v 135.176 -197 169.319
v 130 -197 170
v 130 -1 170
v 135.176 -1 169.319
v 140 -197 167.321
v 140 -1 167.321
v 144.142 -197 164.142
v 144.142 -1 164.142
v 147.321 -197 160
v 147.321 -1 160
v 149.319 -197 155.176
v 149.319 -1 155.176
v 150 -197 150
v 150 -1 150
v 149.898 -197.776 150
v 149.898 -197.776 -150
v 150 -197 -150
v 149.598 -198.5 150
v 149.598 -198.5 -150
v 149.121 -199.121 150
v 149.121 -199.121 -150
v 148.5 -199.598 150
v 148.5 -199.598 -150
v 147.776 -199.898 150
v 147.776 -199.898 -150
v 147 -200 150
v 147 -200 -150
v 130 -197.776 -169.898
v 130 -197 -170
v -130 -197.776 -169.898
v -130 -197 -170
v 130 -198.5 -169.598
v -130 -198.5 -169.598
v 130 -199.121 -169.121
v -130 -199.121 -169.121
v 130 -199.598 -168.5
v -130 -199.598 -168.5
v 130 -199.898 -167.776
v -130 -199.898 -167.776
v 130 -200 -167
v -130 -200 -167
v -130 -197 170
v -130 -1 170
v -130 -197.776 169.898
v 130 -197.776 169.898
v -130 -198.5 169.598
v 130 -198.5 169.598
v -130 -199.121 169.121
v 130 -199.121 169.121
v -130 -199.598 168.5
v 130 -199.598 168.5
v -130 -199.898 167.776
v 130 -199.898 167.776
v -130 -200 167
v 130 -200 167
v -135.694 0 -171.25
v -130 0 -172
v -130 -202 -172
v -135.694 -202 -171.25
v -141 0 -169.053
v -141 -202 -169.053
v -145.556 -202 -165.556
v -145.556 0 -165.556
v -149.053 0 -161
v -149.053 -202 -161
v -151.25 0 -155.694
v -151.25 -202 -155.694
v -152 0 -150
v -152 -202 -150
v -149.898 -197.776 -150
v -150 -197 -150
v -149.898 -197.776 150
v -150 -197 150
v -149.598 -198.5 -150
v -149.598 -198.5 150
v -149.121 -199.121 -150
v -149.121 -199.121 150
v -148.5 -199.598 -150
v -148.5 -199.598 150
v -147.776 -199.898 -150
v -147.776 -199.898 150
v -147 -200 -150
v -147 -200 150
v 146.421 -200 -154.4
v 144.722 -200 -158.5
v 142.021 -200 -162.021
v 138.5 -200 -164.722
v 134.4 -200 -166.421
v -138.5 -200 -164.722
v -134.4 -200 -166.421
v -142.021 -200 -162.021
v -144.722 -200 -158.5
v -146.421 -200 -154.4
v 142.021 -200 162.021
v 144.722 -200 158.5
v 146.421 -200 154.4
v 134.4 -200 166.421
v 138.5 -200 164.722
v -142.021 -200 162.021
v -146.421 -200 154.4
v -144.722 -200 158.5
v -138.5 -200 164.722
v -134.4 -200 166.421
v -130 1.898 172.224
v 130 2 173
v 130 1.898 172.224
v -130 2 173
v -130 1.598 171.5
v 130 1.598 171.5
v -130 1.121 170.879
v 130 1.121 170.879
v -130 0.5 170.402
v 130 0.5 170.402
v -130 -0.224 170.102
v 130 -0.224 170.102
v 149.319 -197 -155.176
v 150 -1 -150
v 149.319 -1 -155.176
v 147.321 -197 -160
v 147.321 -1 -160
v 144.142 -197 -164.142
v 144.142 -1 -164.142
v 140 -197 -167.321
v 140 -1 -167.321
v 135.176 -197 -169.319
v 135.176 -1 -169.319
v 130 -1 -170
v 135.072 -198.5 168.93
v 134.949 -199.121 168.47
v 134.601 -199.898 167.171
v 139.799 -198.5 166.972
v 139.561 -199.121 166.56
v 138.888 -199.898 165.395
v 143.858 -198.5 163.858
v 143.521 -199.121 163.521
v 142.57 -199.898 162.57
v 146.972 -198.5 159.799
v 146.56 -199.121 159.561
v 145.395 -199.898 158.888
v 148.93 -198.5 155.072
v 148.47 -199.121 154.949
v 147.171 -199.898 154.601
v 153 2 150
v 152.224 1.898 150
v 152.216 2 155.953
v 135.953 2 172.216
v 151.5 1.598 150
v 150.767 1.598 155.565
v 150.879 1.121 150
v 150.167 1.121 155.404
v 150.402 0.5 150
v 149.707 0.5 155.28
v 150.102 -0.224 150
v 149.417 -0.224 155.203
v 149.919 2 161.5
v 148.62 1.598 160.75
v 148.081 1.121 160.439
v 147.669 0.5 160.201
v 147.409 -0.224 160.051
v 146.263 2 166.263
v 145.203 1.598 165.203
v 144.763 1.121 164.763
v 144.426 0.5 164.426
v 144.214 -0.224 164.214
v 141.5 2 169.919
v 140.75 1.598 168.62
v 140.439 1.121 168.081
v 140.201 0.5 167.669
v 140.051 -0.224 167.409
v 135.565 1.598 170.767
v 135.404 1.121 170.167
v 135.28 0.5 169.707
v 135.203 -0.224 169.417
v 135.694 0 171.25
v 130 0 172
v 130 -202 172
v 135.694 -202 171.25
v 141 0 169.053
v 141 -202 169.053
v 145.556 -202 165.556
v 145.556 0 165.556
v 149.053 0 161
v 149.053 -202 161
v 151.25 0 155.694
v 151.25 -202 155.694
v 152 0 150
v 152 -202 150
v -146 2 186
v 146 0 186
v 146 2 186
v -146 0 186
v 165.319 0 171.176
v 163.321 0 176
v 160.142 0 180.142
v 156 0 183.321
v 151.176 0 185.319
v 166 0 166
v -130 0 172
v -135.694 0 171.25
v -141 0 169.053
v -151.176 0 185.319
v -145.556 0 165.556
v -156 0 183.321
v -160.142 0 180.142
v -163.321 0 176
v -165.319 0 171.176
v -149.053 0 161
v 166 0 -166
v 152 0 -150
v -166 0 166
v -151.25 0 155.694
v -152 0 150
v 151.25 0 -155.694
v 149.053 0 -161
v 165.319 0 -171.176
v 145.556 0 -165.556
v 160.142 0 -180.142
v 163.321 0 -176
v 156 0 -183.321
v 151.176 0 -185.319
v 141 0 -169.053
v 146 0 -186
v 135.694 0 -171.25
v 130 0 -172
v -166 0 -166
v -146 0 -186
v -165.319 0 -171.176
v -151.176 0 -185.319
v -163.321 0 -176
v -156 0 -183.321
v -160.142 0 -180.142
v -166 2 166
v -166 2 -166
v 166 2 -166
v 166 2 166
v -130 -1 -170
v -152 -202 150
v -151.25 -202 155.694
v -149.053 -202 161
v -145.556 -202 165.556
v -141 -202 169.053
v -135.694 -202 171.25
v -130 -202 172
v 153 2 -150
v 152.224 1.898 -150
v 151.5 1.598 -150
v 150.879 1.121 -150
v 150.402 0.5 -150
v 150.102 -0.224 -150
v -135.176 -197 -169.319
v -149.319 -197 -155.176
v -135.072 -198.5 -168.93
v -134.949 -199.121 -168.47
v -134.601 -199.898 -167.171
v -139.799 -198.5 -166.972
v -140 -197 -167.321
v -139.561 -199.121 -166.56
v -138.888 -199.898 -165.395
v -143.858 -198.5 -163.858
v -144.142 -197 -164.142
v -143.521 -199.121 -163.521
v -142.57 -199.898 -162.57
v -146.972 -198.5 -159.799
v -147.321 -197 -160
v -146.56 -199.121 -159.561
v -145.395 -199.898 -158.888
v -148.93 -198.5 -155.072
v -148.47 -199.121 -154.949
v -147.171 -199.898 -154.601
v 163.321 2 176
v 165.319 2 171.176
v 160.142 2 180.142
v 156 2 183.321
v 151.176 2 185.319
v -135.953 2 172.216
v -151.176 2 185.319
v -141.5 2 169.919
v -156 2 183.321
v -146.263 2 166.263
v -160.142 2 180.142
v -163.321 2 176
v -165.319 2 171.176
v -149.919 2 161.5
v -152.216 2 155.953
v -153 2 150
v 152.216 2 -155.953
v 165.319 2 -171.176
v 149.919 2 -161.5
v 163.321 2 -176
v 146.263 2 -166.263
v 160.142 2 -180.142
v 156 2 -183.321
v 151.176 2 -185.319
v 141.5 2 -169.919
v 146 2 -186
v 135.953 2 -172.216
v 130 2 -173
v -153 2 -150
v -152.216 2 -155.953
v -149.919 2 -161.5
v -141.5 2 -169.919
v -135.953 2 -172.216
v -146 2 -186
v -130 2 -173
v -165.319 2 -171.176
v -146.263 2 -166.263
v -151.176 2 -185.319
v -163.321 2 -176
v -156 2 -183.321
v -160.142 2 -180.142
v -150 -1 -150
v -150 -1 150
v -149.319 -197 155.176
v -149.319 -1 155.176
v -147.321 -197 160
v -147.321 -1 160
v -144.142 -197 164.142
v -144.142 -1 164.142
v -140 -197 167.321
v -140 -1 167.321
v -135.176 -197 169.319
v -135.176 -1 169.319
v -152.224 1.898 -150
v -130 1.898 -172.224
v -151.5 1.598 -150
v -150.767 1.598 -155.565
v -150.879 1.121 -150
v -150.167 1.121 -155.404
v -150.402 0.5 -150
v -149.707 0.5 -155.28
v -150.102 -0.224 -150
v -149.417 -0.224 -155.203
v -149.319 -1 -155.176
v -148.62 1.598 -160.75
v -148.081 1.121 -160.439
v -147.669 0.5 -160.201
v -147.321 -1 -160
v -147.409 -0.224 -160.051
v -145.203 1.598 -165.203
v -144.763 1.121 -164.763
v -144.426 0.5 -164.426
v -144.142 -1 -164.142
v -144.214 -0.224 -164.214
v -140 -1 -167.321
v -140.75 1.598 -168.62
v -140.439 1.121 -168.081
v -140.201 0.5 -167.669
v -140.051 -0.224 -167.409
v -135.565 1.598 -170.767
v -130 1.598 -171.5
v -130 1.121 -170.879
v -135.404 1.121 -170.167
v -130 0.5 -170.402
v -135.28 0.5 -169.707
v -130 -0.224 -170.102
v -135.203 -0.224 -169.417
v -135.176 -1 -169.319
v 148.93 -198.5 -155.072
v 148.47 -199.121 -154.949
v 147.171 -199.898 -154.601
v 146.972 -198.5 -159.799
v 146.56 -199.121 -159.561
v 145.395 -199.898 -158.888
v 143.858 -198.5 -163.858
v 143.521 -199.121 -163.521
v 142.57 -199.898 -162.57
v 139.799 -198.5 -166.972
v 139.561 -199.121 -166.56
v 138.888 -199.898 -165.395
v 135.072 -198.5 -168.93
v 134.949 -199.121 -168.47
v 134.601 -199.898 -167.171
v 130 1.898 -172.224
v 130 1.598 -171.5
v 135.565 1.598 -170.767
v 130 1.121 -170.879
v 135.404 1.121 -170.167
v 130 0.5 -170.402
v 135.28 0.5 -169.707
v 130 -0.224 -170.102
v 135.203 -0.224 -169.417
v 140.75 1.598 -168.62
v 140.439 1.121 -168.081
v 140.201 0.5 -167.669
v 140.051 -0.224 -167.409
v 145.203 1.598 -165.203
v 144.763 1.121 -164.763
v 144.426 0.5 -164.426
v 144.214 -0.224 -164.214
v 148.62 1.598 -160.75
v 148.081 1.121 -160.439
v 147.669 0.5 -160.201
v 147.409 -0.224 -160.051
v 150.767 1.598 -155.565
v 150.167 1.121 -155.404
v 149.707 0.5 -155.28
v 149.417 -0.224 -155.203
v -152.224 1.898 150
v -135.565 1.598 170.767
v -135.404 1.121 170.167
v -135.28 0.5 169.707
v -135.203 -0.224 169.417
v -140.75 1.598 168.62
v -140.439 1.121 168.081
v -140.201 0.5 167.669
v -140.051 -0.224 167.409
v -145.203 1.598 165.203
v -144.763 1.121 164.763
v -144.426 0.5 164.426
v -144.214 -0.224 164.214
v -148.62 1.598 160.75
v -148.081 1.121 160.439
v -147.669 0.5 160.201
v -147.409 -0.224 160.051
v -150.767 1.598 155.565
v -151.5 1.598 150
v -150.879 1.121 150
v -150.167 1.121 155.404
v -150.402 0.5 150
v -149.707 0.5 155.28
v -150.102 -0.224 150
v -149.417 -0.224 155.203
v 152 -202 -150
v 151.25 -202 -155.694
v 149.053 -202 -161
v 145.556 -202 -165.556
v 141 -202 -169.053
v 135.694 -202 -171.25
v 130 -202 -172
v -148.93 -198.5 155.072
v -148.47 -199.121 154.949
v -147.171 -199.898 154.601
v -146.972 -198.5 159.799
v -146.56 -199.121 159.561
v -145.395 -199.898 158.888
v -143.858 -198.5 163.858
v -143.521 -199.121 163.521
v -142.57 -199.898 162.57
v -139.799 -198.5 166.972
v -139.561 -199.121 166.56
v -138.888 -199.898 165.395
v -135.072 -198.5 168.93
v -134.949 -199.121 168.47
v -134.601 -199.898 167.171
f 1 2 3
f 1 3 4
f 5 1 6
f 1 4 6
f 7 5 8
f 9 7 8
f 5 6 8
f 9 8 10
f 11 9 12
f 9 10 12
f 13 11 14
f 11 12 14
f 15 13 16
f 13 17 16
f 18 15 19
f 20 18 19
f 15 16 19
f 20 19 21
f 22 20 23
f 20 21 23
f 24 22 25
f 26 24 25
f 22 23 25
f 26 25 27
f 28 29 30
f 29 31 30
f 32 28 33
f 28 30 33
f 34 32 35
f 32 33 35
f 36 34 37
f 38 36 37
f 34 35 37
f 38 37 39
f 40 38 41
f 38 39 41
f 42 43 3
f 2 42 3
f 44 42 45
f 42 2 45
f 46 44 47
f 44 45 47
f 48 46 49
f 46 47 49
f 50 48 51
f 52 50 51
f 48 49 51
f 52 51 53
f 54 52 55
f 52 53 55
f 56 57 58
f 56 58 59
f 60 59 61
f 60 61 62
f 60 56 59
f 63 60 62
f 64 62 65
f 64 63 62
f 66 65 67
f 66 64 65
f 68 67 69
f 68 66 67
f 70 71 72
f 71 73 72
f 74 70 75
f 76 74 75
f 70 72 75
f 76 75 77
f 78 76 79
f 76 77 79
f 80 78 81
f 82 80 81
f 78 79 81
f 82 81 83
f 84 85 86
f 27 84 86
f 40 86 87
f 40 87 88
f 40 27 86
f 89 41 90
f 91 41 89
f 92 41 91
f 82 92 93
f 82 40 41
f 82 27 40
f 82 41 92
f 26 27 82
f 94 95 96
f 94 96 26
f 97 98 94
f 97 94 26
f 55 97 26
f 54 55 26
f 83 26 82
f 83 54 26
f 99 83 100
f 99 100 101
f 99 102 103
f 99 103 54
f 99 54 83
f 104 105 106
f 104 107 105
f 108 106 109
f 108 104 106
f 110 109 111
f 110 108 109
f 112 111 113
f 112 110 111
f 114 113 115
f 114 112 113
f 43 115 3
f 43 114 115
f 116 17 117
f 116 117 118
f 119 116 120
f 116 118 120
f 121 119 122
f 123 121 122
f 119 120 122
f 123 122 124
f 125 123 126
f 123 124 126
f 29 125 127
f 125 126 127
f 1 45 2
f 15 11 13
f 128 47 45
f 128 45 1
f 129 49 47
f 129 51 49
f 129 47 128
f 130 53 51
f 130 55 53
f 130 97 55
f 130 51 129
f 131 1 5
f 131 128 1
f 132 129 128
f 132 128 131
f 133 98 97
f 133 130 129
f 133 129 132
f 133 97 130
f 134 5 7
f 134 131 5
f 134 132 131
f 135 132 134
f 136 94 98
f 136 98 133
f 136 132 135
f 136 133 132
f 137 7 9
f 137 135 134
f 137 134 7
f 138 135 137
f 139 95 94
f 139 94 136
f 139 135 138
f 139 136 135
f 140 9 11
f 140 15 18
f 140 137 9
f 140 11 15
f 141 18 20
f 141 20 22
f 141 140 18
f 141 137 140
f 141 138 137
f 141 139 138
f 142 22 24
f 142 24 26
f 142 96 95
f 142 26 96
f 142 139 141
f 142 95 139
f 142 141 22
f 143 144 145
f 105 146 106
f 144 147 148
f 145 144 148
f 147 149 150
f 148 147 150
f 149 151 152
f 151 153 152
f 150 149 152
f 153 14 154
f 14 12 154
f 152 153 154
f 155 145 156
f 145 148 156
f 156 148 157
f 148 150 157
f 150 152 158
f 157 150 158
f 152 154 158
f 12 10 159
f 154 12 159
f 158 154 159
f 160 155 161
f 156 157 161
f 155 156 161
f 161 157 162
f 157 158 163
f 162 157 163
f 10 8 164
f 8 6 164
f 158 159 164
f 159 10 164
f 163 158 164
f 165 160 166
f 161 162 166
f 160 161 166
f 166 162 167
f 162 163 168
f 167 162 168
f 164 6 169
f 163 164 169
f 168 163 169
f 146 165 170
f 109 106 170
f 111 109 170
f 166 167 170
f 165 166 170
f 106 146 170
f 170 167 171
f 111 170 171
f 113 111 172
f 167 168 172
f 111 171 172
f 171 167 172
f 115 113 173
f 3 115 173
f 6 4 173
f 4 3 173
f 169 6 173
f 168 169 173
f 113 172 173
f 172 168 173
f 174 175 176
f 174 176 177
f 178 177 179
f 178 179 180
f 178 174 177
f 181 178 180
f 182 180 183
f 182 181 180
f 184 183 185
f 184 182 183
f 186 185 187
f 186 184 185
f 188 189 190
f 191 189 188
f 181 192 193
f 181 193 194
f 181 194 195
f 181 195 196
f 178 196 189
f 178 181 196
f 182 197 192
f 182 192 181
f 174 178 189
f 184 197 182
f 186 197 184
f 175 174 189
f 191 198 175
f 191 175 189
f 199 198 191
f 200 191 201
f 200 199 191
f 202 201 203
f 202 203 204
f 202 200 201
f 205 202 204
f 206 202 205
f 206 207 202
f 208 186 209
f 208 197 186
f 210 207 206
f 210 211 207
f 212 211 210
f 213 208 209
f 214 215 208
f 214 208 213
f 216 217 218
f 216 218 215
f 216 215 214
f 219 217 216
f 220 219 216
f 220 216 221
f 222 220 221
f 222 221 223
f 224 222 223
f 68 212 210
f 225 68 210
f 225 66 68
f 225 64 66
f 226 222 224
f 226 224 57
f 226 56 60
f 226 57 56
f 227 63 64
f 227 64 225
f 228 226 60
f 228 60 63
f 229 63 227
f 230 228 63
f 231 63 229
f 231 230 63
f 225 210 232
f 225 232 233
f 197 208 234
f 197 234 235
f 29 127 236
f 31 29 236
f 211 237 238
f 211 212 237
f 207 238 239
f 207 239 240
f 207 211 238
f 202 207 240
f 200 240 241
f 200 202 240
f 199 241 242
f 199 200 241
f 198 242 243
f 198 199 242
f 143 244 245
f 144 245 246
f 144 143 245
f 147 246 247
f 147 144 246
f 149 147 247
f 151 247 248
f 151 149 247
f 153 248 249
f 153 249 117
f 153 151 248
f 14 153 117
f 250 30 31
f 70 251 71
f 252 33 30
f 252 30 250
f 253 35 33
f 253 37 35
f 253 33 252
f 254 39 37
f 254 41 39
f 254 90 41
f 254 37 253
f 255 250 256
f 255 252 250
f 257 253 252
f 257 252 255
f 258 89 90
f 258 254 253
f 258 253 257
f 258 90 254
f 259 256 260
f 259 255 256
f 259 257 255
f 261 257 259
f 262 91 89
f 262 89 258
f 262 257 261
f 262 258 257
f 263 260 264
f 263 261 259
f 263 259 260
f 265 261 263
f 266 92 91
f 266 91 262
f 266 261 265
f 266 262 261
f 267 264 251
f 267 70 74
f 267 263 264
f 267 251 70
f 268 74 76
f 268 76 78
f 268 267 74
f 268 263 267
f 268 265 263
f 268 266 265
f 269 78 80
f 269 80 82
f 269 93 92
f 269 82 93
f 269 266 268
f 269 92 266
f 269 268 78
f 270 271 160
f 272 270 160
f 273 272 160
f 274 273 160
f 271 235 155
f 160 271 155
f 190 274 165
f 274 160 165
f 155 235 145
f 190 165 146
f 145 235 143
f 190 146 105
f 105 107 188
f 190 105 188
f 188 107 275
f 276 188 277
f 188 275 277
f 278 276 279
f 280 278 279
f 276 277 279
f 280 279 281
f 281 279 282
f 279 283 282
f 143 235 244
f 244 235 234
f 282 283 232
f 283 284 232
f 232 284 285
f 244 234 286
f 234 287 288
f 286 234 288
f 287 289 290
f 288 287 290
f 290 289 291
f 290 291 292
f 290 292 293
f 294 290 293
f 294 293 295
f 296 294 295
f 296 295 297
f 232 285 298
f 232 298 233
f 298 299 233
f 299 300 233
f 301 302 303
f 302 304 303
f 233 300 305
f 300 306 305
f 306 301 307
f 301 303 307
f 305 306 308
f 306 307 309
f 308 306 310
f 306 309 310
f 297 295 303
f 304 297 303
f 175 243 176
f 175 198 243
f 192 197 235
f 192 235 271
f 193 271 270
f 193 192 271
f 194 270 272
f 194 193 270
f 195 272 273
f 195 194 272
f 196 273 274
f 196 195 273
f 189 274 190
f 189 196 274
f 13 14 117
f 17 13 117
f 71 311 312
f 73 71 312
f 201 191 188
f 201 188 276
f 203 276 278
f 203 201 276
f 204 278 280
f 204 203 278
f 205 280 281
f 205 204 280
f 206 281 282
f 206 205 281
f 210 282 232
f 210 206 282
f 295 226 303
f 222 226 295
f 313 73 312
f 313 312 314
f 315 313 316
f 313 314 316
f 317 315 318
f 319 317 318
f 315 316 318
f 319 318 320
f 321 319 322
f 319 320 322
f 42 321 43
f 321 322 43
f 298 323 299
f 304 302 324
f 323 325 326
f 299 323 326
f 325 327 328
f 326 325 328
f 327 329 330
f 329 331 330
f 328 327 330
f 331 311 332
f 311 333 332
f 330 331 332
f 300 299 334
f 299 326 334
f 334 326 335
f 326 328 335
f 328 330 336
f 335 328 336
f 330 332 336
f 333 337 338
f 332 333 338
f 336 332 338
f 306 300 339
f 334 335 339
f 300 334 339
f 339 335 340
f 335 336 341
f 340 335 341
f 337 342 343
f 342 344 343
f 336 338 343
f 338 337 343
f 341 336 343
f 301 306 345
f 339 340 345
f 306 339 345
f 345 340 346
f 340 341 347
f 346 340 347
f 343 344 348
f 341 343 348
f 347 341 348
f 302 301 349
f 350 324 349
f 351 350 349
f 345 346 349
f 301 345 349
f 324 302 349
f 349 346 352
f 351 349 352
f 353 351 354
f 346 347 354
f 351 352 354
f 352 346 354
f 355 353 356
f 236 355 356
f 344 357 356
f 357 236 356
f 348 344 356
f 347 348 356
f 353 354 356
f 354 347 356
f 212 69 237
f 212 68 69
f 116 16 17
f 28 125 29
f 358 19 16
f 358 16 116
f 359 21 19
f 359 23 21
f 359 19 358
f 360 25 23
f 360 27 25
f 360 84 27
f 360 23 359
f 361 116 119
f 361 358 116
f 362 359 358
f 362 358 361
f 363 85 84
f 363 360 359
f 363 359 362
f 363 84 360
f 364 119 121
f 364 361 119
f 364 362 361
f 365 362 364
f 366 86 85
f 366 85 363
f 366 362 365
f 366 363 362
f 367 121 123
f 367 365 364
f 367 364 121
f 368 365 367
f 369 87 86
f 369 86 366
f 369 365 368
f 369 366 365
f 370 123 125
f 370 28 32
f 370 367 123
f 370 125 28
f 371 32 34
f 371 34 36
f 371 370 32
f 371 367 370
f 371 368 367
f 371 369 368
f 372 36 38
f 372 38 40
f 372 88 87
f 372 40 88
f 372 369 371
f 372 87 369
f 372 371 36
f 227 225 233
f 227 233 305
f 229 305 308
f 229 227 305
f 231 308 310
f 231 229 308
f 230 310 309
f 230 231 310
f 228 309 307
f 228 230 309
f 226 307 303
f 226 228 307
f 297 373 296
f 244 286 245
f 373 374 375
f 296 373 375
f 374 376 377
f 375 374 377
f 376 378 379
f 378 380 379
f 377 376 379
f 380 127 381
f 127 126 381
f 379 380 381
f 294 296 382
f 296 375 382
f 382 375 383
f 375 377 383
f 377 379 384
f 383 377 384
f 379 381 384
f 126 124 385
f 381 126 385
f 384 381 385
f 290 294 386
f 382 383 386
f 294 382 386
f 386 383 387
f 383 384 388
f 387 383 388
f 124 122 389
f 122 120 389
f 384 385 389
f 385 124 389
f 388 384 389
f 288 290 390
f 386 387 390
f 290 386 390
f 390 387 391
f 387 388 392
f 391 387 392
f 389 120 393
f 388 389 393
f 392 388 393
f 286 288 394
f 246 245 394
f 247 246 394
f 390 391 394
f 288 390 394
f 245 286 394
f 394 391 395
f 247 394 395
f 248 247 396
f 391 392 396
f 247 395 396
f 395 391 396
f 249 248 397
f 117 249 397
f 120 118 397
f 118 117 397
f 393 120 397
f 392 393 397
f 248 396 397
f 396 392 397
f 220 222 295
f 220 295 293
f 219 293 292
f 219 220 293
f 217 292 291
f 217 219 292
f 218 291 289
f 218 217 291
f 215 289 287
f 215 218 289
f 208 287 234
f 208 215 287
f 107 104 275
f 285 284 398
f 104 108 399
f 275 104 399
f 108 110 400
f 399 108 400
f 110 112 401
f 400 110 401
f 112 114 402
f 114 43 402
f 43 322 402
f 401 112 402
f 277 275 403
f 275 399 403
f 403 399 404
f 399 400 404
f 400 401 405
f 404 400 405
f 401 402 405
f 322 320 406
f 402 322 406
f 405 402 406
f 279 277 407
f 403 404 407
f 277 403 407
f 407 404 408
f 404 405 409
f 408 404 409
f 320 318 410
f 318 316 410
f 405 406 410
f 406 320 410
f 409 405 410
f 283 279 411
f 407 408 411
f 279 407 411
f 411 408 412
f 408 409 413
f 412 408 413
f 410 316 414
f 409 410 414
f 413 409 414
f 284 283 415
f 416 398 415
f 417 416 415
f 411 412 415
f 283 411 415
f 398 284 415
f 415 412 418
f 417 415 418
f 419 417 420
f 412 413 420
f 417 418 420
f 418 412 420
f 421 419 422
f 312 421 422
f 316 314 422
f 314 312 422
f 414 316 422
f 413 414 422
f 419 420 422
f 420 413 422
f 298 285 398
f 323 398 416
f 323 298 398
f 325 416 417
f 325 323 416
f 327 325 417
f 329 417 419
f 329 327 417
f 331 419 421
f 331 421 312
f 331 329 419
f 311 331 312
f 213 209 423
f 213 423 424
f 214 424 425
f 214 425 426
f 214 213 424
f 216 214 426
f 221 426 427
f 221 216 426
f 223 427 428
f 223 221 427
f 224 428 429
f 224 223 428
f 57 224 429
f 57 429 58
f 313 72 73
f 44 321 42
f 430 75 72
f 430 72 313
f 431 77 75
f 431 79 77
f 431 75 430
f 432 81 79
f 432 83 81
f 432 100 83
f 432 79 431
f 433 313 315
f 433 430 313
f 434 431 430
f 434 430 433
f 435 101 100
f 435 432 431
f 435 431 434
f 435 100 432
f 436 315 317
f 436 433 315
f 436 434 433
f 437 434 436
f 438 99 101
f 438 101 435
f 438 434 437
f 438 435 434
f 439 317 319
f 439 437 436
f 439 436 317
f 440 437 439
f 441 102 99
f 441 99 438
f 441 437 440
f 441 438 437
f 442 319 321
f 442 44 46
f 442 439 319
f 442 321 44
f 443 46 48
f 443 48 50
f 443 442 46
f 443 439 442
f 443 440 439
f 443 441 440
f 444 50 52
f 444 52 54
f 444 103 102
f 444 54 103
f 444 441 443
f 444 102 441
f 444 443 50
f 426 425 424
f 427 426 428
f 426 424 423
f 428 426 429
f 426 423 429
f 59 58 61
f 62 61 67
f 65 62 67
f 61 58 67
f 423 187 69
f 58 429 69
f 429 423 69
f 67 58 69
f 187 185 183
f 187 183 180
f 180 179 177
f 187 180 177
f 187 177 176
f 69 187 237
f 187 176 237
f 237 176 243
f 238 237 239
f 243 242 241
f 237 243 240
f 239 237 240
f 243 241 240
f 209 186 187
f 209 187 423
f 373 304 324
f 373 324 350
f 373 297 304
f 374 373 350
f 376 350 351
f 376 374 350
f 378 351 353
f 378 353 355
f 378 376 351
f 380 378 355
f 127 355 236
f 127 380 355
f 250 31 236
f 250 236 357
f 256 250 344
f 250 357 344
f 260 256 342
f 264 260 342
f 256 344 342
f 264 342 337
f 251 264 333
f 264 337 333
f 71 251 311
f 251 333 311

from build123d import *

# Parameters (mm, degrees)
BOSS_EXTRUDE1_DEPTH = 2
CUT_EXTRUDE1_REACH  = 251.311
BOSS_EXTRUDE2_DEPTH = 200
BOSS_EXTRUDE3_DEPTH = 2
FILLET1_R           = 3


with BuildPart() as part:
    # Sketch1 → Boss-Extrude1 (new body)
    with BuildSketch(Plane(origin=(0, 0, 0), x_dir=(1, 0, 0), z_dir=(0, 1, 0))):
        with BuildLine():
            Line((-146, 186), (146, 186))
            ThreePointArc((146, 186), (160.142135624, 180.142135624), (166, 166))
            Line((166, 166), (166, -166))
            ThreePointArc((166, -166), (160.142135624, -180.142135624), (146, -186))
            Line((146, -186), (-146, -186))
            ThreePointArc((-146, -186), (-160.142135624, -180.142135624), (-166, -166))
            Line((-166, -166), (-166, 166))
            ThreePointArc((-166, 166), (-160.142135624, 180.142135624), (-146, 186))
        make_face()
    extrude(amount=BOSS_EXTRUDE1_DEPTH)

    # Sketch2 → Cut-Extrude1 (cut, up to next)
    with BuildSketch(Plane(origin=(0, 2, 0), x_dir=(1, 0, 0), z_dir=(0, 1, 0)), mode=Mode.PRIVATE) as cut_extrude1_sk1:
        with BuildLine():
            Line((-130, 170), (130, 170))
            ThreePointArc((130, 170), (144.142135624, 164.142135624), (150, 150))
            Line((150, 150), (150, -150))
            ThreePointArc((150, -150), (144.142135624, -164.142135624), (130, -170))
            Line((130, -170), (-130, -170))
            ThreePointArc((-130, -170), (-144.142135624, -164.142135624), (-150, -150))
            Line((-150, -150), (-150, 150))
            ThreePointArc((-150, 150), (-144.142135624, 164.142135624), (-130, 170))
        make_face()
    cut_extrude1_tool1 = extrude(cut_extrude1_sk1.sketch, amount=-CUT_EXTRUDE1_REACH, mode=Mode.PRIVATE) & part.part
    add(cut_extrude1_tool1.solids().sort_by_distance((0, 2, 0))[0], mode=Mode.SUBTRACT)

    # Sketch3 → Boss-Extrude2 (add)
    with BuildSketch(Plane.XZ):
        with BuildLine():
            Line((-152, 150), (-152, -150))
            ThreePointArc((-152, -150), (-145.556349186, -165.556349186), (-130, -172))
            Line((-130, -172), (130, -172))
            ThreePointArc((130, -172), (145.556349186, -165.556349186), (152, -150))
            Line((152, -150), (152, 150))
            ThreePointArc((152, 150), (145.556349186, 165.556349186), (130, 172))
            Line((130, 172), (-130, 172))
            ThreePointArc((-130, 172), (-145.556349186, 165.556349186), (-152, 150))
        make_face()
        with BuildLine():
            Line((-130, 170), (130, 170))
            ThreePointArc((130, 170), (144.142135624, 164.142135624), (150, 150))
            Line((150, 150), (150, -150))
            ThreePointArc((150, -150), (144.142135624, -164.142135624), (130, -170))
            Line((130, -170), (-130, -170))
            ThreePointArc((-130, -170), (-144.142135624, -164.142135624), (-150, -150))
            Line((-150, -150), (-150, 150))
            ThreePointArc((-150, 150), (-144.142135624, 164.142135624), (-130, 170))
        make_face(mode=Mode.SUBTRACT)
    extrude(amount=BOSS_EXTRUDE2_DEPTH)

    # Sketch4 → Boss-Extrude3 (add)
    with BuildSketch(Plane.XZ.offset(200)):
        with BuildLine():
            Line((-130, 172), (130, 172))
            ThreePointArc((130, 172), (145.556349186, 165.556349186), (152, 150))
            Line((152, 150), (152, -150))
            ThreePointArc((152, -150), (145.556349186, -165.556349186), (130, -172))
            Line((130, -172), (-130, -172))
            ThreePointArc((-130, -172), (-145.556349186, -165.556349186), (-152, -150))
            Line((-152, -150), (-152, 150))
            ThreePointArc((-152, 150), (-145.556349186, 165.556349186), (-130, 172))
        make_face()
    extrude(amount=BOSS_EXTRUDE3_DEPTH)

    # Fillet1
    fillet1_edges = [part.edges().sort_by_distance(p)[0] for p in [
        (-144.142135624, 2, 164.142135624),
        (0, 2, 170),
        (144.142135624, 2, 164.142135624),
        (150, 2, 0),
        (144.142135624, 2, -164.142135624),
        (0, 2, -170),
        (-144.142135624, 2, -164.142135624),
        (-150, 2, 0),
        (-144.142135624, -200, -164.142135624),
        (0, -200, -170),
        (144.142135624, -200, -164.142135624),
        (150, -200, 0),
        (144.142135624, -200, 164.142135624),
        (0, -200, 170),
        (-144.142135624, -200, 164.142135624),
        (-150, -200, 0),
    ]]
    fillet(fillet1_edges, radius=FILLET1_R)


solid = part.part
